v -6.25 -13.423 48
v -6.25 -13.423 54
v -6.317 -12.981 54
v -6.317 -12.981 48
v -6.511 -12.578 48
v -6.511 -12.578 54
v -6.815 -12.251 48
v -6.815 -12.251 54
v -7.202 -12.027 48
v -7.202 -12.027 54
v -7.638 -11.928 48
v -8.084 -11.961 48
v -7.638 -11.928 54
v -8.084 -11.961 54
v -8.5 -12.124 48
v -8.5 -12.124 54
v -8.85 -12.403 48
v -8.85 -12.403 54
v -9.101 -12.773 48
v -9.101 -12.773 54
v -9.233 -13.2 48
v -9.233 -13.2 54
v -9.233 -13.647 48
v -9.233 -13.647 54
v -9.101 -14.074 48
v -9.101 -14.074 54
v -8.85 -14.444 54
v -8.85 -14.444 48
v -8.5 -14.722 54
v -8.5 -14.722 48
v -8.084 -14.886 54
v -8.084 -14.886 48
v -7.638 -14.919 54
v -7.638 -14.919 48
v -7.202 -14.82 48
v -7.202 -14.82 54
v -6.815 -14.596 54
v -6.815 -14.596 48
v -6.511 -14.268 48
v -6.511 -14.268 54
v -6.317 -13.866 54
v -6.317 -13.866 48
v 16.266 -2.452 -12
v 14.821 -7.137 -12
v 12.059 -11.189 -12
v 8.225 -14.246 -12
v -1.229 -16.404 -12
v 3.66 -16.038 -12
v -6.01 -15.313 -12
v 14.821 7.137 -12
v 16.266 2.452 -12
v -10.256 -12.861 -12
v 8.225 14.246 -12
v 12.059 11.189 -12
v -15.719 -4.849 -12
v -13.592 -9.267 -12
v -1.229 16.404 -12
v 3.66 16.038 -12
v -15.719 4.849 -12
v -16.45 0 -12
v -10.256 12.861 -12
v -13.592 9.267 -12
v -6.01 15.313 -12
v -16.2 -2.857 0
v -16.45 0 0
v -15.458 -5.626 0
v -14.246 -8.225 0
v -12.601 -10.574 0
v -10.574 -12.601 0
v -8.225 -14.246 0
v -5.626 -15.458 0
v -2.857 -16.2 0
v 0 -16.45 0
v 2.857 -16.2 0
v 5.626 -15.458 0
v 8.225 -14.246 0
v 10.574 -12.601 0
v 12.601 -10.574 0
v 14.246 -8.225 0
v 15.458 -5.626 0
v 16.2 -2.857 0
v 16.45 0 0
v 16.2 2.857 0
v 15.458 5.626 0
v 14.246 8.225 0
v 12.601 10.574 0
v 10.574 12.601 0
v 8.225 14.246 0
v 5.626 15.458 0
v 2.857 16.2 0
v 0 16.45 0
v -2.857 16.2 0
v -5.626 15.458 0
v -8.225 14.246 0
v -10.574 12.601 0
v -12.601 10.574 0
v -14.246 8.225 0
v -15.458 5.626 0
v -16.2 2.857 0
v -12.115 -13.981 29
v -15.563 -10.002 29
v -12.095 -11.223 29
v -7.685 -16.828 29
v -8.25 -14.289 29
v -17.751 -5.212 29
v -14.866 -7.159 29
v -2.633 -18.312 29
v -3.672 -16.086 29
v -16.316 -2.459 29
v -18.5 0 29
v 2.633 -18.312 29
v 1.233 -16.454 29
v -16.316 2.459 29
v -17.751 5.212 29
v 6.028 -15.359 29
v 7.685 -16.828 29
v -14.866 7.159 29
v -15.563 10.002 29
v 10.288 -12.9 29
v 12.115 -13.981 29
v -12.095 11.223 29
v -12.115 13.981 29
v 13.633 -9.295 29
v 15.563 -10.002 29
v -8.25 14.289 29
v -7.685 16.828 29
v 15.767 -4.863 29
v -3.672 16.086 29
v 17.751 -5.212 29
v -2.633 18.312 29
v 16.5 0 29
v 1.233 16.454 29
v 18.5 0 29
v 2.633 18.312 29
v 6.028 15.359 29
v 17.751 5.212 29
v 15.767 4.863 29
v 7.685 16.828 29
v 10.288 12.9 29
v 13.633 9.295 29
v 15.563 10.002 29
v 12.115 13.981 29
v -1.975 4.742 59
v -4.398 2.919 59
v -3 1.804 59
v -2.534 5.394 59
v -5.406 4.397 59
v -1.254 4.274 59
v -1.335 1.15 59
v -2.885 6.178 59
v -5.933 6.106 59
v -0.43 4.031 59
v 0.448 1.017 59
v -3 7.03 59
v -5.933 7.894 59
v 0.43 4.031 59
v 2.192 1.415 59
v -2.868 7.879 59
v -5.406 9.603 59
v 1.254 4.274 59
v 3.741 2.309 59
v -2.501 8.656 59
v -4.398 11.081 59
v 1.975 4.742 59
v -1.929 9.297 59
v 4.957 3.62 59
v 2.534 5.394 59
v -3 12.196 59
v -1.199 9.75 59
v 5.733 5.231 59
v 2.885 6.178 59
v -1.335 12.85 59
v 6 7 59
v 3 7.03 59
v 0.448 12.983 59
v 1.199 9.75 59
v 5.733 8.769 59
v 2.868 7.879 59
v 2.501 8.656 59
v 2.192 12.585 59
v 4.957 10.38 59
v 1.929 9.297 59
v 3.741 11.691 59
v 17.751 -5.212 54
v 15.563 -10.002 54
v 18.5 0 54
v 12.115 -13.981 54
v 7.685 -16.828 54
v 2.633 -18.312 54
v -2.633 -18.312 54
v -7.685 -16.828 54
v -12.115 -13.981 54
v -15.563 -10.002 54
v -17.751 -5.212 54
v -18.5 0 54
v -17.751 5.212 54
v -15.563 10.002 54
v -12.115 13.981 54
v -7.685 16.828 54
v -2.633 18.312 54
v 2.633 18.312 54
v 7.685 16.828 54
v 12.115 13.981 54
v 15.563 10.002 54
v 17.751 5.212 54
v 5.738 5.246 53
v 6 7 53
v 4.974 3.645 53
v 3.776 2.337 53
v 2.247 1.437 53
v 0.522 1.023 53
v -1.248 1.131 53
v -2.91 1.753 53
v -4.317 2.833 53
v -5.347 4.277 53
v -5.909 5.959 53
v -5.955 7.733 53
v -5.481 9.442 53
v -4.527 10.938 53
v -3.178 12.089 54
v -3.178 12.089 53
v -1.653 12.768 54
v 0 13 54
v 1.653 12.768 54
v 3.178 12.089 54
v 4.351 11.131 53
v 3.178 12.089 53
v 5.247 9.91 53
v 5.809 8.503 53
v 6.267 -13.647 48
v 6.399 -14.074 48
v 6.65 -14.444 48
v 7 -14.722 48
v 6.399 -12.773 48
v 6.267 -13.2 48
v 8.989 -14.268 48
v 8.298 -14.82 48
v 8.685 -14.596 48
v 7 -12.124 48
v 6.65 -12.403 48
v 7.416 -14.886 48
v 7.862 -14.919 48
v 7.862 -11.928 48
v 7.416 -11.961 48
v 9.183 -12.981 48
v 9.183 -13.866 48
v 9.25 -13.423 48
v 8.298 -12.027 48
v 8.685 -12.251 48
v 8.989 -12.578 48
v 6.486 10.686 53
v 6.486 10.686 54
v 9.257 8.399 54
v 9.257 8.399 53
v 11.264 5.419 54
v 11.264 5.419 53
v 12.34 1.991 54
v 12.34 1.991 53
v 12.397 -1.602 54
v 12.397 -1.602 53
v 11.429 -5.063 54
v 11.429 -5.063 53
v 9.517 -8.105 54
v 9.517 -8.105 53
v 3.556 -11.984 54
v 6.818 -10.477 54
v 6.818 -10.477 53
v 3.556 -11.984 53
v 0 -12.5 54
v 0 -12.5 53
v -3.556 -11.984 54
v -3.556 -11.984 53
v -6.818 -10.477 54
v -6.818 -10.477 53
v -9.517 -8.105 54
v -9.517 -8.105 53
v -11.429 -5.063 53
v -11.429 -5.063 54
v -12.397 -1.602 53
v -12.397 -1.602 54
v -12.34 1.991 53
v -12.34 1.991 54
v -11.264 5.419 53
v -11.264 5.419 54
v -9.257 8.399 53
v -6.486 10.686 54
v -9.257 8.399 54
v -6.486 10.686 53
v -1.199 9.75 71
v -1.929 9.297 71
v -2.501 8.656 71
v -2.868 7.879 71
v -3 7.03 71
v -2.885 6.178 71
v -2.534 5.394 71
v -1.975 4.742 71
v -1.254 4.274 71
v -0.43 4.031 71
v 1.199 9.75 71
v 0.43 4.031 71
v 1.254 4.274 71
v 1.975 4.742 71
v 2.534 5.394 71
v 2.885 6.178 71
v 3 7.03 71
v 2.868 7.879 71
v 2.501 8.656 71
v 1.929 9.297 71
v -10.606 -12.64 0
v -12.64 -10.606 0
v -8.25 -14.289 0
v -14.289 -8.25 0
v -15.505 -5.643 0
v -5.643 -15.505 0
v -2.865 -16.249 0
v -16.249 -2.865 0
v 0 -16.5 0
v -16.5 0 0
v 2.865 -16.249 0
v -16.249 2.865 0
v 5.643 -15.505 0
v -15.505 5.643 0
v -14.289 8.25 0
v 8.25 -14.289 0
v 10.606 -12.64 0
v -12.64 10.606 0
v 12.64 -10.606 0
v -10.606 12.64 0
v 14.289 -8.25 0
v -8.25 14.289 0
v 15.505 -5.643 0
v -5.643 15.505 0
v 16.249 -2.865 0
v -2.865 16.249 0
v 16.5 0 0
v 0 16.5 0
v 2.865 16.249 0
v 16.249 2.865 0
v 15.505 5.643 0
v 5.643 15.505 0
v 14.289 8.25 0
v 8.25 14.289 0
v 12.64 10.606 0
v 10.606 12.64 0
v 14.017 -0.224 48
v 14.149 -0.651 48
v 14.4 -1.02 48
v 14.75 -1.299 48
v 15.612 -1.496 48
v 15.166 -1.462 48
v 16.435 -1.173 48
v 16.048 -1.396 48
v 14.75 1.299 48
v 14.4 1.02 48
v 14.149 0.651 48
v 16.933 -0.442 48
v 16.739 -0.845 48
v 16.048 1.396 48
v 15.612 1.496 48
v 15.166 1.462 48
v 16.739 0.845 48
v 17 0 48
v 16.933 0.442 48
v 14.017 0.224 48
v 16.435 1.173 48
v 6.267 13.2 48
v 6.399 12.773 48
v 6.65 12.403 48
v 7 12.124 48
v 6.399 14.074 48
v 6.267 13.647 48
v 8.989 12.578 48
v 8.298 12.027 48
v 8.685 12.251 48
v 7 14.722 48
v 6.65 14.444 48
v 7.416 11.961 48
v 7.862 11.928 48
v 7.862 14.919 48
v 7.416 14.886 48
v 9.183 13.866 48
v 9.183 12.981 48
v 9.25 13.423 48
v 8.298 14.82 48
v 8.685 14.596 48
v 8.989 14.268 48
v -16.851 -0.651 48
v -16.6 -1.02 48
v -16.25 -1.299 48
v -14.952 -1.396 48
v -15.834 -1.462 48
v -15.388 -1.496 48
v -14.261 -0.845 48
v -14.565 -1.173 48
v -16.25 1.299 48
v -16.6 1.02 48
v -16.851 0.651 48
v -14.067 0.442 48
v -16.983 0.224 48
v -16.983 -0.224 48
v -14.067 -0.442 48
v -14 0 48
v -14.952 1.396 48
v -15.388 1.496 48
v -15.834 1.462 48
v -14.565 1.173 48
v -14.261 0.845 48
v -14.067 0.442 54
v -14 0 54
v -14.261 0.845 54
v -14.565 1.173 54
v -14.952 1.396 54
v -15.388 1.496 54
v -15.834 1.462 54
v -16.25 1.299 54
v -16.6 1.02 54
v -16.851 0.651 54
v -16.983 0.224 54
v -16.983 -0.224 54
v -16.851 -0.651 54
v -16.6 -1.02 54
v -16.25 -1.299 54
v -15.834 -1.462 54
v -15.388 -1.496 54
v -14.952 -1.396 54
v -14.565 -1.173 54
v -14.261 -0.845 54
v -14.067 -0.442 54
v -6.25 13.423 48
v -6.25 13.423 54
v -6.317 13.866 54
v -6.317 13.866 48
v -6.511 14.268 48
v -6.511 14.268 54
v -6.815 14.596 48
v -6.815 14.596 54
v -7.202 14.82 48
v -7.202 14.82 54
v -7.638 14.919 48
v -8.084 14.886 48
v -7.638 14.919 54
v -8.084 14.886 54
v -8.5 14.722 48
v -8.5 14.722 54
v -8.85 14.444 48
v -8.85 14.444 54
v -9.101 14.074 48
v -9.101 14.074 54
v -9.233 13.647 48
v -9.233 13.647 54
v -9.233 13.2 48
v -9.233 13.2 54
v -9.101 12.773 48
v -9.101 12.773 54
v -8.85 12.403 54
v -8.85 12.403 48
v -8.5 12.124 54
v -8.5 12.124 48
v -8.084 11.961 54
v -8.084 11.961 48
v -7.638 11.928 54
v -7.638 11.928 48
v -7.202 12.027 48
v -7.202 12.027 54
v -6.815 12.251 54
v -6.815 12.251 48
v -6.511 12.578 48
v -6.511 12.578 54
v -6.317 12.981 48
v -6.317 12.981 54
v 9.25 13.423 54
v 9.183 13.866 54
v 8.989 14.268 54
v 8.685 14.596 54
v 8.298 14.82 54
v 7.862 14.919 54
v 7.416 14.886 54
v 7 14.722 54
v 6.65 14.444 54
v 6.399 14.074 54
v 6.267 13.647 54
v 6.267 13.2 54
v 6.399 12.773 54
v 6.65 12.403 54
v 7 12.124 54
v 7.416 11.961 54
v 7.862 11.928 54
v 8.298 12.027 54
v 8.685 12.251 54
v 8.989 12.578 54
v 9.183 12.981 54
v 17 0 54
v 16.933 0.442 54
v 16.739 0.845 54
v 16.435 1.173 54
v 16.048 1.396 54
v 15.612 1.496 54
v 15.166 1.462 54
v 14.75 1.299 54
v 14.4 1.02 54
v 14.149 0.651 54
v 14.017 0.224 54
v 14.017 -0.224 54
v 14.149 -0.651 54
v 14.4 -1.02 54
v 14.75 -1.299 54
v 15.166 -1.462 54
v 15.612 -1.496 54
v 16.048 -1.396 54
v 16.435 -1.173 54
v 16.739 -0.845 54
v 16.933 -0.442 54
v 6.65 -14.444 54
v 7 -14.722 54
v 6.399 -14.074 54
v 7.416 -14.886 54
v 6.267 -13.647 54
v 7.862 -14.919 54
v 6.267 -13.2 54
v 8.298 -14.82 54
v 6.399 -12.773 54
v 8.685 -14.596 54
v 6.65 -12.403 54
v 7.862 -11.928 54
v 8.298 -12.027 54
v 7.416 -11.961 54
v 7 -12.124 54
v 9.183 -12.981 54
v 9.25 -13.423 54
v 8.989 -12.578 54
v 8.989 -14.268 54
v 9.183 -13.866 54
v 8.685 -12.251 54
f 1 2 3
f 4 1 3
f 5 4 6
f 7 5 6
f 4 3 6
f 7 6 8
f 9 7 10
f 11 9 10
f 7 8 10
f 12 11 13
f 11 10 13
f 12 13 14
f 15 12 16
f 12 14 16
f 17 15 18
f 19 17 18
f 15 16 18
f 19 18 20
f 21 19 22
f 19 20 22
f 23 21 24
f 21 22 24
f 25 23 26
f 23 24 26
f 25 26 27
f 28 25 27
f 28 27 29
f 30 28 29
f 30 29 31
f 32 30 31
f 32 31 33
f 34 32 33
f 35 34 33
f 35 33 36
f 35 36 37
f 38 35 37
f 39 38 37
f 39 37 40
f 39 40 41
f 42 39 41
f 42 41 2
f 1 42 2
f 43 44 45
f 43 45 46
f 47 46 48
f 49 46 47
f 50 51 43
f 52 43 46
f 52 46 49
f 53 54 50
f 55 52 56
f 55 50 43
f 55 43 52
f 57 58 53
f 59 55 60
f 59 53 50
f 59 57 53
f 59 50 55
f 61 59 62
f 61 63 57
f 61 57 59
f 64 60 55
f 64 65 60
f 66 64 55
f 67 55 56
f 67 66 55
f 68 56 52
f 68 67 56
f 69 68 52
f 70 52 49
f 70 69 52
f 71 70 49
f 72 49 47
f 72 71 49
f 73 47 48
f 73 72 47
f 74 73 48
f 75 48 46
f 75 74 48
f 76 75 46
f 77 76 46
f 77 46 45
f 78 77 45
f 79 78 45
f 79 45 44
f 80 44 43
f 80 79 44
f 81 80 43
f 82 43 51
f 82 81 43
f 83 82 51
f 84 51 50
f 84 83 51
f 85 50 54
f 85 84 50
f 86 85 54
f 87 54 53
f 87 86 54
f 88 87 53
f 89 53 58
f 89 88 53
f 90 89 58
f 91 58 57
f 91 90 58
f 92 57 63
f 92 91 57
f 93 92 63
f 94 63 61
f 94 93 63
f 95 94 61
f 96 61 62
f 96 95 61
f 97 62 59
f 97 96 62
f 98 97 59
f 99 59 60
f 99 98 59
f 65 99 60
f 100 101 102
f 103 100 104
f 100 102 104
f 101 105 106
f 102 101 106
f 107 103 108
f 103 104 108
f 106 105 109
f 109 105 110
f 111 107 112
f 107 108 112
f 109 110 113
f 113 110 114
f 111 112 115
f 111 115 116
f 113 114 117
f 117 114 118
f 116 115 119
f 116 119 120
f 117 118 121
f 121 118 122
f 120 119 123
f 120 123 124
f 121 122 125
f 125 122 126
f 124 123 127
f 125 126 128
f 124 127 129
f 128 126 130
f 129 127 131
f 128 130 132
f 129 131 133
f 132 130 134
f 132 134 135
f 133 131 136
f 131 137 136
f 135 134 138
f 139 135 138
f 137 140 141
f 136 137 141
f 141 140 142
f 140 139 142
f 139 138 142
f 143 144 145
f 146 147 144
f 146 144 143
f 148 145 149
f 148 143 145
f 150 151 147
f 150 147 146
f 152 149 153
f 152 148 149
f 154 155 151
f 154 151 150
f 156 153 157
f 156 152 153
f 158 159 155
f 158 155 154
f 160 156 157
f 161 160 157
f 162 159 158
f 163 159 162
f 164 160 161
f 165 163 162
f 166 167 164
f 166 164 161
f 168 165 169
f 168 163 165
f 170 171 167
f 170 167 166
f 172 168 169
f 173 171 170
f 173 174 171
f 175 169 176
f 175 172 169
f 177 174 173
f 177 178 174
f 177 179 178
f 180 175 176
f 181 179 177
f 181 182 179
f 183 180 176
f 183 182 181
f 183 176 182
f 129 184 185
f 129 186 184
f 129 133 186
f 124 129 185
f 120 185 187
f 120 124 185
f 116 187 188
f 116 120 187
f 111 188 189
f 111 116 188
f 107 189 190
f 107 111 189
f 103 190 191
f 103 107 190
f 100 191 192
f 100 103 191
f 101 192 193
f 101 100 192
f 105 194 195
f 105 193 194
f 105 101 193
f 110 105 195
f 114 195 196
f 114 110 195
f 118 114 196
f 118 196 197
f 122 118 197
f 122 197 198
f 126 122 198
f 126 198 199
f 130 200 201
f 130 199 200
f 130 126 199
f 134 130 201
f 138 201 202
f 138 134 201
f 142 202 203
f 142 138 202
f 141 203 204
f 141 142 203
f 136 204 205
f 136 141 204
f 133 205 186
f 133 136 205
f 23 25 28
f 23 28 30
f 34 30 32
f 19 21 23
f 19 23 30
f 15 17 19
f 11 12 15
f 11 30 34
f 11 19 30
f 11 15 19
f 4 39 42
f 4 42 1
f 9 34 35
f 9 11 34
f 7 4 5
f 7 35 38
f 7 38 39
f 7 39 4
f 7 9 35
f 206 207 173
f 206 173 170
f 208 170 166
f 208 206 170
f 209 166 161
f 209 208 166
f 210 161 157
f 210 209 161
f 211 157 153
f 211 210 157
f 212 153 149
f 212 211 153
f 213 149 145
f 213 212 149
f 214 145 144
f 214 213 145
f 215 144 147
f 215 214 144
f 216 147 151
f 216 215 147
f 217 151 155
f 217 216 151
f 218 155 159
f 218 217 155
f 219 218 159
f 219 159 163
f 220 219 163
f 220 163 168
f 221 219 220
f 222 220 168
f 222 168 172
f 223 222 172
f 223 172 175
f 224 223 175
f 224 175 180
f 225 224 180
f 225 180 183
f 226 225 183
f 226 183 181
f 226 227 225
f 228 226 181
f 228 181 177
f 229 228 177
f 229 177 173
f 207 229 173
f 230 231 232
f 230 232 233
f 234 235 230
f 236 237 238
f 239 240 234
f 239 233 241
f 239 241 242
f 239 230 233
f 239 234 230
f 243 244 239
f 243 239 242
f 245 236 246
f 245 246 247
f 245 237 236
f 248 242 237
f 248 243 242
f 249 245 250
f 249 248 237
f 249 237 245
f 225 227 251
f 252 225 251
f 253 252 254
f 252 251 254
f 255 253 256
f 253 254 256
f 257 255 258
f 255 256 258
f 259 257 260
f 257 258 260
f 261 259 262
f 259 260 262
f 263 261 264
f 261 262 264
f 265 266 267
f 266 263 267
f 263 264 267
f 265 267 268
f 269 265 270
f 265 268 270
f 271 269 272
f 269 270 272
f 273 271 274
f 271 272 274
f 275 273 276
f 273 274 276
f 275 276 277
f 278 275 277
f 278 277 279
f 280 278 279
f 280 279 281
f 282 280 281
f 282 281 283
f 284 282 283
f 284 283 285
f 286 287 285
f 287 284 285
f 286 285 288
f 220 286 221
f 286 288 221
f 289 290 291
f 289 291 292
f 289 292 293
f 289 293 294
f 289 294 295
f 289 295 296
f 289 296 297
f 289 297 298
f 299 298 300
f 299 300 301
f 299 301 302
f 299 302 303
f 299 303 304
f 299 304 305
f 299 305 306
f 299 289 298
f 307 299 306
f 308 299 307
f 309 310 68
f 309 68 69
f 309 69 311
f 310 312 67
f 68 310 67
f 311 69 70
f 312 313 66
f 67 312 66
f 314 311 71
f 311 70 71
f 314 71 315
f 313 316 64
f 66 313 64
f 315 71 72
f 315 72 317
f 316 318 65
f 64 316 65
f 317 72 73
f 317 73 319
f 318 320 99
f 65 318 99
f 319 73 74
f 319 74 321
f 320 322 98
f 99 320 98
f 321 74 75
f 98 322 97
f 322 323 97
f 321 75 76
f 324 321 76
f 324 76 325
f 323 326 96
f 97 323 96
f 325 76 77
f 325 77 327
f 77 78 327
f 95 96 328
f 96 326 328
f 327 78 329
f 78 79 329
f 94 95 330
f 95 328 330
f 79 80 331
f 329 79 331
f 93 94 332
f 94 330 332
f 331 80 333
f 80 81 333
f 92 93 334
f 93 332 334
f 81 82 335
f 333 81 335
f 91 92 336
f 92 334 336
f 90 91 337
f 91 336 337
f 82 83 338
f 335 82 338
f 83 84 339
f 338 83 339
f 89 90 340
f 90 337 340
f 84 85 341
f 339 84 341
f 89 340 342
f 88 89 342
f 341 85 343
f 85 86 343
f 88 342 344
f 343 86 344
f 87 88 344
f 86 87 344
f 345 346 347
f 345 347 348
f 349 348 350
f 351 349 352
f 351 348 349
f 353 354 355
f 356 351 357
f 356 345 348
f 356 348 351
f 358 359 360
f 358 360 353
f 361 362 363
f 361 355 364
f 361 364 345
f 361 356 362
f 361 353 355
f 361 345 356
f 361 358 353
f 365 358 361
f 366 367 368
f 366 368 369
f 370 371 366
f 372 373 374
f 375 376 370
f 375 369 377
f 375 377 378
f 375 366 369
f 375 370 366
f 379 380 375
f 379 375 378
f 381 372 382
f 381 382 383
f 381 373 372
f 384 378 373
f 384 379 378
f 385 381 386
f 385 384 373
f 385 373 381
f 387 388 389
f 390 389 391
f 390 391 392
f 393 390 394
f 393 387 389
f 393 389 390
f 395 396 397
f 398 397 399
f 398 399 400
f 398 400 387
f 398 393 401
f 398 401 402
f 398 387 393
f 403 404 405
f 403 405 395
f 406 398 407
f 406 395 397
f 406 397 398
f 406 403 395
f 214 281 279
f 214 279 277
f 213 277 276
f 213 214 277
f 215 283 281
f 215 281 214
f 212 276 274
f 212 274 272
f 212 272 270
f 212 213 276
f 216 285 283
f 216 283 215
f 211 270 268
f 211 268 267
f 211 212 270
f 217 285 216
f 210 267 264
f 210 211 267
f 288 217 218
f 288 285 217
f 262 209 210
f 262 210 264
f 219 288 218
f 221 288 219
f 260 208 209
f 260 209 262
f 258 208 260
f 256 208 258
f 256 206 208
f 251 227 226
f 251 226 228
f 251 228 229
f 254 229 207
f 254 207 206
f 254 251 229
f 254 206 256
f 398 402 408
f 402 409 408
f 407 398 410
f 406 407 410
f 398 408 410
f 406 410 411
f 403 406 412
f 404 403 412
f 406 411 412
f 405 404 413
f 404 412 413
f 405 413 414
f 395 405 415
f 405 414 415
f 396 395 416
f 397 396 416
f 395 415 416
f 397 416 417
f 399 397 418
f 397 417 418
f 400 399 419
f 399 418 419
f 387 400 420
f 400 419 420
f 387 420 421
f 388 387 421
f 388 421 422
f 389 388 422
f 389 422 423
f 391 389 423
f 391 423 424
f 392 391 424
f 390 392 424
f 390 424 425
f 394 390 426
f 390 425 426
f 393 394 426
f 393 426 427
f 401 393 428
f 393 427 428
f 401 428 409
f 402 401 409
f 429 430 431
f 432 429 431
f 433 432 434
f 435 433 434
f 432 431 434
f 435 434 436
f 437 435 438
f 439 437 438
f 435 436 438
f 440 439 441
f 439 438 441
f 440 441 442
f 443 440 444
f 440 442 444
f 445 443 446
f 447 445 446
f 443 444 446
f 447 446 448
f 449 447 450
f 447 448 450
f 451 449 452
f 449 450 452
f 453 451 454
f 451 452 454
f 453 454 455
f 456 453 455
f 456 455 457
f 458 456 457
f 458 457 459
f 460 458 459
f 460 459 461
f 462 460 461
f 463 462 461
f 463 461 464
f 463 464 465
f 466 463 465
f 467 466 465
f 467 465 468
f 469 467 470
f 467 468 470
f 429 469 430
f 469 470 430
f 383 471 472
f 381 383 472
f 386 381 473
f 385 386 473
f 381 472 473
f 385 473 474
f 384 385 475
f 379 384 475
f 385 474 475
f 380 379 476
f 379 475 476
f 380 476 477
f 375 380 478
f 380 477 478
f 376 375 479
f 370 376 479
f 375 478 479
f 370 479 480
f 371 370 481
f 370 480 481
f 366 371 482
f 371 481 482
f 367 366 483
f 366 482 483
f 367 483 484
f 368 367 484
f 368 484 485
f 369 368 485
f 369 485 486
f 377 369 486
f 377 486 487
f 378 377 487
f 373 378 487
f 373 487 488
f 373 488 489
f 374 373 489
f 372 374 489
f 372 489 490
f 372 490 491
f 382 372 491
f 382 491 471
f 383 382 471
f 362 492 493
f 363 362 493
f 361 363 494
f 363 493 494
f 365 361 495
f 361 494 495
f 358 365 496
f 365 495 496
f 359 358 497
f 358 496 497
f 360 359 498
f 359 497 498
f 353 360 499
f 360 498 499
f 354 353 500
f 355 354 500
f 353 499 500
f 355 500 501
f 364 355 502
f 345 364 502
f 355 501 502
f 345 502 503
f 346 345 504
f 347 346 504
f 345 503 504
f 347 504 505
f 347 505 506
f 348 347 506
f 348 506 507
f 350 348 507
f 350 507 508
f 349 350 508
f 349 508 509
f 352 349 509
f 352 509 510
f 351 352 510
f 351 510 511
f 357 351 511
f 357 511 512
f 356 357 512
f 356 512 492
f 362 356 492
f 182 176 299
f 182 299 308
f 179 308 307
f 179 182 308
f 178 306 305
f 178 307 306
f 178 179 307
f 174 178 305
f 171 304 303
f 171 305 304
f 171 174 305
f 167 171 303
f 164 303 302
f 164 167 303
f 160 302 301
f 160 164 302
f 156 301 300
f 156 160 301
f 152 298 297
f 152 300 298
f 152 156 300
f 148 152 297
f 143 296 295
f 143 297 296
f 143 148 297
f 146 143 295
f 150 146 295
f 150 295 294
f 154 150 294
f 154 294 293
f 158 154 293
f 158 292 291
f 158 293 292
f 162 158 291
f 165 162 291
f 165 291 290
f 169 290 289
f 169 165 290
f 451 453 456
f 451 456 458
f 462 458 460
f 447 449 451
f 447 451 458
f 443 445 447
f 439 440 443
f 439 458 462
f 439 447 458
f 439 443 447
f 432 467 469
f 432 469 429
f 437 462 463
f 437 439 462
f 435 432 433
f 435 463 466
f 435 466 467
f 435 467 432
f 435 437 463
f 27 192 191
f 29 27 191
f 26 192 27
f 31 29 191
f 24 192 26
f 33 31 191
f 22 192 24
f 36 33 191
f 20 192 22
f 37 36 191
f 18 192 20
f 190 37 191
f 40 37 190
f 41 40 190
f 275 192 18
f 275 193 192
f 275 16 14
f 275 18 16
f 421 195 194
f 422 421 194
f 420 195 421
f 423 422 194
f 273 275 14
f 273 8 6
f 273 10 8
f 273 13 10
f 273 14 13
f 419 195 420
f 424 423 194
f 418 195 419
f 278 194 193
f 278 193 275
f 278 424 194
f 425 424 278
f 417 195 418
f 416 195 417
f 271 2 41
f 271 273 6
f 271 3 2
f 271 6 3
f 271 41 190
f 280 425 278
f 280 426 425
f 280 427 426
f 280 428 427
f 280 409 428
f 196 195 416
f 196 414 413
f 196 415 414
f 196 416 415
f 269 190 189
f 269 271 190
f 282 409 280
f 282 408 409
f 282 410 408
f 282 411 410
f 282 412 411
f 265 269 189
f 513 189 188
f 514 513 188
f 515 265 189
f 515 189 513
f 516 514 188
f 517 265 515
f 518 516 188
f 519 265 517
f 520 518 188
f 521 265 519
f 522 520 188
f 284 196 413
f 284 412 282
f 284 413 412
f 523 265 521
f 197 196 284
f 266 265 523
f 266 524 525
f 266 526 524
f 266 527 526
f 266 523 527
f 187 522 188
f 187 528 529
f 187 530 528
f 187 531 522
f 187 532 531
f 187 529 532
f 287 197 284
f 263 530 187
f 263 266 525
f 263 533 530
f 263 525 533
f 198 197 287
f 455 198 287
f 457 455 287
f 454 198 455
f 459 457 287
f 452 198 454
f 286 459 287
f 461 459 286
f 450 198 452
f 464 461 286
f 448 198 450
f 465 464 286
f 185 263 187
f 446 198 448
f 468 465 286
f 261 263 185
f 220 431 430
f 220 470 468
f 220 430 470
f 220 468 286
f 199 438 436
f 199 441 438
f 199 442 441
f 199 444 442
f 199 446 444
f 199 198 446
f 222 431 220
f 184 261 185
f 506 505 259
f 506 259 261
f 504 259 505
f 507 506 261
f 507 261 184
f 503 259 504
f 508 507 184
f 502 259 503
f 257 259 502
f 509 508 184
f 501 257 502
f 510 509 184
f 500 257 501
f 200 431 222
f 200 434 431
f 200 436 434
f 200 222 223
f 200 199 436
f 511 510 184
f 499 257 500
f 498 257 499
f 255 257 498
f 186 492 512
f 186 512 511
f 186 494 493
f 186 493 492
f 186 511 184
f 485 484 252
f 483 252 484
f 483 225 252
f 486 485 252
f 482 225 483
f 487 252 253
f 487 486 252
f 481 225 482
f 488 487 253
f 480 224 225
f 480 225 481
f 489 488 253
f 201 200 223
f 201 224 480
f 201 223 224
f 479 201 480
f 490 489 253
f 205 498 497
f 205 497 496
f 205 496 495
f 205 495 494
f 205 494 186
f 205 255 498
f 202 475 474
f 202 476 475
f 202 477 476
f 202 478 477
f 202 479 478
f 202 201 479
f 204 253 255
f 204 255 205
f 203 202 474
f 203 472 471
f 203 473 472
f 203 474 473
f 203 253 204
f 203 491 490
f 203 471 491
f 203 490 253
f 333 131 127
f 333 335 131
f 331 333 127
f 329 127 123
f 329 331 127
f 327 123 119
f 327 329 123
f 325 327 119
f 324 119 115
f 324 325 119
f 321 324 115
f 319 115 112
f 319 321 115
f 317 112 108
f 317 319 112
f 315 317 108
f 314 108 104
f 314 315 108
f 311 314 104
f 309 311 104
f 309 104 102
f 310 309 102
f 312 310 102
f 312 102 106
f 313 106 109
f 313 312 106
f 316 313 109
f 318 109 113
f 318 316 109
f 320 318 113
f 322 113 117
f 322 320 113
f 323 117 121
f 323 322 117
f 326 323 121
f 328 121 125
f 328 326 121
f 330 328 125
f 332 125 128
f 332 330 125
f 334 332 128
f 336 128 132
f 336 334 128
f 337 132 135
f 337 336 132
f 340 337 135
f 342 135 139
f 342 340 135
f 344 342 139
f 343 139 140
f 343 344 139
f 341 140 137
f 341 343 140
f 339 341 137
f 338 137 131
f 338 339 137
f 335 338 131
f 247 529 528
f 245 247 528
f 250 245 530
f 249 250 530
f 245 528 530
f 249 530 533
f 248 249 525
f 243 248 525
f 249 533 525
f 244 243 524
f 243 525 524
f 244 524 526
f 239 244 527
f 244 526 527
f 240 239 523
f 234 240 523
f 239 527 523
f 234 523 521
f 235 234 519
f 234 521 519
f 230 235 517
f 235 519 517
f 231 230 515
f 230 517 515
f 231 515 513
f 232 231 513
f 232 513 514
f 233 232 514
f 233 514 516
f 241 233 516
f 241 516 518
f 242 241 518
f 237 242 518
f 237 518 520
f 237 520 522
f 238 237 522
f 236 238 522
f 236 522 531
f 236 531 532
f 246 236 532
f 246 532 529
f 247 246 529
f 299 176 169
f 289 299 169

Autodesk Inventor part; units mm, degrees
ref_plane "YZ Plane" through (0, 0, 0) normal (1, 0, 0) x (0, 1, 0)
ref_plane "XZ Plane" through (0, 0, 0) normal (0, 1, 0) x (-1, 0, 0)
ref_plane "XY Plane" through (0, 0, 0) normal (0, 0, 1) x (1, 0, 0)
sketch "Sketch1" plane through (0, 0, 0) normal (0, 0, 1) x (1, 0, 0)
  circle A0 centre (0, 0) radius 16.5
  dimension "d0" = 33
extrude "Extrusion1" add sketch "Sketch1" along normal blind 29
sketch "Sketch2" plane through (0, 0, 29) normal (0, 0, 1) x (1, 0, 0)
  circle A0 centre (0, 0) radius 18.5
  dimension "d3" = 37
extrude "Extrusion2" add sketch "Sketch2" along normal blind 24
sketch "Sketch3" plane through (0, 0, 53) normal (0, 0, 1) x (1, 0, 0)
  line L0 (0, 0) -> (0, 7)
  circle A0 centre (0, 7) radius 6
  dimension "d6" = 7
  dimension "d7" = 12
extrude "Extrusion3" add sketch "Sketch3" along normal blind 6
sketch "Sketch4" plane through (0, 7, 59) normal (0, 0, 1) x (1, 0, 0)
  circle A0 centre (0, 0) radius 6 projected
  arc A1 (-1.199, 2.75) -> (1.199, 2.75) centre (0, 0) ccw
  line L0 (0, 0) -> (0, 2.75)
  line L1 (0, 2.75) -> (1.199, 2.75)
  line L2 (0, 2.75) -> (-1.199, 2.75)
  point P0 (0, -7)
  dimension "d10" = 6
  dimension "d11" = 2.75
extrude "Extrusion4" add sketch "Sketch4" along normal blind 12 contours L2 L1 A1
sketch "Sketch5" plane through (0, 0, 0) normal (0, 0, -1) x (-1, 0, 0)
  circle A0 centre (0, 0) radius 16.45
  dimension "d16" = 32.9
extrude "Extrusion5" add sketch "Sketch5" along normal blind 12
sketch "Sketch6" plane through (0, 0, 53) normal (0, 0, 1) x (1, 0, 0)
  circle A0 centre (0, 0) radius 18.5
  arc A1 (-3.1779, 12.0893) -> (3.1779, 12.0893) centre (0, 0) ccw
  circle A2 centre (0, 7) radius 6 projected
  dimension "d17" = 25
extrude "Extrusion6" add sketch "Sketch6" along normal blind 1
sketch "Sketch8" plane through (0, 0, 54) normal (0, 0, 1) x (1, 0, 0)
  circle A0 centre (0, 0) radius 18.5 projected
  arc A1 (-3.1779, 12.0893) -> (3.1779, 12.0893) centre (0, 0) ccw projected
  line L0 (12.5, 0) -> (18.5, 0)
  circle A2 centre (15.5, 0) radius 1.5
  circle A3 centre (7.75, 13.4234) radius 1.5
  circle A4 centre (-7.75, 13.4234) radius 1.5
  circle A5 centre (-15.5, 0) radius 1.5
  circle A6 centre (-7.75, -13.4234) radius 1.5
  circle A7 centre (7.75, -13.4234) radius 1.5
  arc A8 (-1.199, 9.75) -> (1.199, 9.75) centre (0, 7) ccw projected
  line L1 (-1.199, 9.75) -> (1.199, 9.75) projected
  circle A9 centre (0, 7) radius 6 projected
  circle A10 centre (0, 7) radius 6 projected
  line L2 (1.199, 9.75) -> (-1.199, 9.75) projected
  arc A11 (-1.199, 9.75) -> (1.199, 9.75) centre (0, 7) ccw projected
  dimension "d44" = 3
  dimension "d47" = 360
extrude "Extrusion7" cut sketch "Sketch8" against normal blind 6 contours A2 L0 | L0 A2 | A3 | A4 | A5 | A6 | A7
thread "Thread7" size "5-40 UNC" class "2B" standard "ANSI Unified Screw Threads" full length
thread "Thread8" size "5-40 UNC" class "2B" standard "ANSI Unified Screw Threads" full length
thread "Thread9" size "5-40 UNC" class "2B" standard "ANSI Unified Screw Threads" full length
thread "Thread10" size "5-40 UNC" class "2B" standard "ANSI Unified Screw Threads" full length
thread "Thread11" size "5-40 UNC" class "2B" standard "ANSI Unified Screw Threads" full length
thread "Thread12" size "5-40 UNC" class "2B" standard "ANSI Unified Screw Threads" full length
sketch "Sketch9" plane through (0, 7, 71) normal (0, 0, 1) x (1, 0, 0)
  line L0 (1.199, 2.75) -> (-1.199, 2.75) projected
  arc A0 (-1.199, 2.75) -> (1.199, 2.75) centre (0, 0) ccw projected
  circle A1 centre (0, -7) radius 18.5 projected
  circle A2 centre (-7.75, -20.4234) radius 1.5 projected
  line L1 (0, 0) -> (-7.75, -20.4234)
  circle A3 centre (0, -7) radius 16.5 projected
  circle A4 centre (7.75, -20.4234) radius 1.5 projected
  circle A5 centre (-7.75, 6.4234) radius 1.5 projected
  line L2 (7.75, -20.4234) -> (-7.75, 6.4234)
  line L3 (0, -7) -> (-10.8253, -13.25)
  arc A6 (-3.1779, 5.0893) -> (3.1779, 5.0893) centre (0, -7) ccw projected
  line L4 (-16.8637, 0.607) -> (0, -7)
  line L5 (0, -7) -> (-16.8637, 0.607)
  line L6 (-16.8637, 0.607) -> (-26.1272, -19.9291)
  line L7 (-7.75, -20.4234) -> (-23.3448, -13.7609)
  line L8 (0, 0) -> (4.1821, 11.0211)
  line L9 (0, 0) -> (-13.8561, 5.2579)
  line L10 (-13.8561, 5.2579) -> (18.5, -7.0201)
  circle A7 centre (0, -7) radius 18.5 projected
  line L11 (0, 0) -> (18.5, -7.0201)
sketch "Sketch10" plane through (0, 0, -12) normal (0, 0, -1) x (-1, 0, 0)
  circle A0 centre (0, 0) radius 16.5 projected
  line L0 (0, 16.5) -> (0, -16.5)
  line L1 (-16.5, 0) -> (16.5, 0)
ref_plane "Work Plane1" through (16.5, 0, -12) normal (0, -1, 0) x (-1, 0, 0)
ref_plane "Work Plane2" through (0, 16.5, -12) normal (1, 0, 0) x (0, -1, 0)
properties part number "251RPM-Motor"
